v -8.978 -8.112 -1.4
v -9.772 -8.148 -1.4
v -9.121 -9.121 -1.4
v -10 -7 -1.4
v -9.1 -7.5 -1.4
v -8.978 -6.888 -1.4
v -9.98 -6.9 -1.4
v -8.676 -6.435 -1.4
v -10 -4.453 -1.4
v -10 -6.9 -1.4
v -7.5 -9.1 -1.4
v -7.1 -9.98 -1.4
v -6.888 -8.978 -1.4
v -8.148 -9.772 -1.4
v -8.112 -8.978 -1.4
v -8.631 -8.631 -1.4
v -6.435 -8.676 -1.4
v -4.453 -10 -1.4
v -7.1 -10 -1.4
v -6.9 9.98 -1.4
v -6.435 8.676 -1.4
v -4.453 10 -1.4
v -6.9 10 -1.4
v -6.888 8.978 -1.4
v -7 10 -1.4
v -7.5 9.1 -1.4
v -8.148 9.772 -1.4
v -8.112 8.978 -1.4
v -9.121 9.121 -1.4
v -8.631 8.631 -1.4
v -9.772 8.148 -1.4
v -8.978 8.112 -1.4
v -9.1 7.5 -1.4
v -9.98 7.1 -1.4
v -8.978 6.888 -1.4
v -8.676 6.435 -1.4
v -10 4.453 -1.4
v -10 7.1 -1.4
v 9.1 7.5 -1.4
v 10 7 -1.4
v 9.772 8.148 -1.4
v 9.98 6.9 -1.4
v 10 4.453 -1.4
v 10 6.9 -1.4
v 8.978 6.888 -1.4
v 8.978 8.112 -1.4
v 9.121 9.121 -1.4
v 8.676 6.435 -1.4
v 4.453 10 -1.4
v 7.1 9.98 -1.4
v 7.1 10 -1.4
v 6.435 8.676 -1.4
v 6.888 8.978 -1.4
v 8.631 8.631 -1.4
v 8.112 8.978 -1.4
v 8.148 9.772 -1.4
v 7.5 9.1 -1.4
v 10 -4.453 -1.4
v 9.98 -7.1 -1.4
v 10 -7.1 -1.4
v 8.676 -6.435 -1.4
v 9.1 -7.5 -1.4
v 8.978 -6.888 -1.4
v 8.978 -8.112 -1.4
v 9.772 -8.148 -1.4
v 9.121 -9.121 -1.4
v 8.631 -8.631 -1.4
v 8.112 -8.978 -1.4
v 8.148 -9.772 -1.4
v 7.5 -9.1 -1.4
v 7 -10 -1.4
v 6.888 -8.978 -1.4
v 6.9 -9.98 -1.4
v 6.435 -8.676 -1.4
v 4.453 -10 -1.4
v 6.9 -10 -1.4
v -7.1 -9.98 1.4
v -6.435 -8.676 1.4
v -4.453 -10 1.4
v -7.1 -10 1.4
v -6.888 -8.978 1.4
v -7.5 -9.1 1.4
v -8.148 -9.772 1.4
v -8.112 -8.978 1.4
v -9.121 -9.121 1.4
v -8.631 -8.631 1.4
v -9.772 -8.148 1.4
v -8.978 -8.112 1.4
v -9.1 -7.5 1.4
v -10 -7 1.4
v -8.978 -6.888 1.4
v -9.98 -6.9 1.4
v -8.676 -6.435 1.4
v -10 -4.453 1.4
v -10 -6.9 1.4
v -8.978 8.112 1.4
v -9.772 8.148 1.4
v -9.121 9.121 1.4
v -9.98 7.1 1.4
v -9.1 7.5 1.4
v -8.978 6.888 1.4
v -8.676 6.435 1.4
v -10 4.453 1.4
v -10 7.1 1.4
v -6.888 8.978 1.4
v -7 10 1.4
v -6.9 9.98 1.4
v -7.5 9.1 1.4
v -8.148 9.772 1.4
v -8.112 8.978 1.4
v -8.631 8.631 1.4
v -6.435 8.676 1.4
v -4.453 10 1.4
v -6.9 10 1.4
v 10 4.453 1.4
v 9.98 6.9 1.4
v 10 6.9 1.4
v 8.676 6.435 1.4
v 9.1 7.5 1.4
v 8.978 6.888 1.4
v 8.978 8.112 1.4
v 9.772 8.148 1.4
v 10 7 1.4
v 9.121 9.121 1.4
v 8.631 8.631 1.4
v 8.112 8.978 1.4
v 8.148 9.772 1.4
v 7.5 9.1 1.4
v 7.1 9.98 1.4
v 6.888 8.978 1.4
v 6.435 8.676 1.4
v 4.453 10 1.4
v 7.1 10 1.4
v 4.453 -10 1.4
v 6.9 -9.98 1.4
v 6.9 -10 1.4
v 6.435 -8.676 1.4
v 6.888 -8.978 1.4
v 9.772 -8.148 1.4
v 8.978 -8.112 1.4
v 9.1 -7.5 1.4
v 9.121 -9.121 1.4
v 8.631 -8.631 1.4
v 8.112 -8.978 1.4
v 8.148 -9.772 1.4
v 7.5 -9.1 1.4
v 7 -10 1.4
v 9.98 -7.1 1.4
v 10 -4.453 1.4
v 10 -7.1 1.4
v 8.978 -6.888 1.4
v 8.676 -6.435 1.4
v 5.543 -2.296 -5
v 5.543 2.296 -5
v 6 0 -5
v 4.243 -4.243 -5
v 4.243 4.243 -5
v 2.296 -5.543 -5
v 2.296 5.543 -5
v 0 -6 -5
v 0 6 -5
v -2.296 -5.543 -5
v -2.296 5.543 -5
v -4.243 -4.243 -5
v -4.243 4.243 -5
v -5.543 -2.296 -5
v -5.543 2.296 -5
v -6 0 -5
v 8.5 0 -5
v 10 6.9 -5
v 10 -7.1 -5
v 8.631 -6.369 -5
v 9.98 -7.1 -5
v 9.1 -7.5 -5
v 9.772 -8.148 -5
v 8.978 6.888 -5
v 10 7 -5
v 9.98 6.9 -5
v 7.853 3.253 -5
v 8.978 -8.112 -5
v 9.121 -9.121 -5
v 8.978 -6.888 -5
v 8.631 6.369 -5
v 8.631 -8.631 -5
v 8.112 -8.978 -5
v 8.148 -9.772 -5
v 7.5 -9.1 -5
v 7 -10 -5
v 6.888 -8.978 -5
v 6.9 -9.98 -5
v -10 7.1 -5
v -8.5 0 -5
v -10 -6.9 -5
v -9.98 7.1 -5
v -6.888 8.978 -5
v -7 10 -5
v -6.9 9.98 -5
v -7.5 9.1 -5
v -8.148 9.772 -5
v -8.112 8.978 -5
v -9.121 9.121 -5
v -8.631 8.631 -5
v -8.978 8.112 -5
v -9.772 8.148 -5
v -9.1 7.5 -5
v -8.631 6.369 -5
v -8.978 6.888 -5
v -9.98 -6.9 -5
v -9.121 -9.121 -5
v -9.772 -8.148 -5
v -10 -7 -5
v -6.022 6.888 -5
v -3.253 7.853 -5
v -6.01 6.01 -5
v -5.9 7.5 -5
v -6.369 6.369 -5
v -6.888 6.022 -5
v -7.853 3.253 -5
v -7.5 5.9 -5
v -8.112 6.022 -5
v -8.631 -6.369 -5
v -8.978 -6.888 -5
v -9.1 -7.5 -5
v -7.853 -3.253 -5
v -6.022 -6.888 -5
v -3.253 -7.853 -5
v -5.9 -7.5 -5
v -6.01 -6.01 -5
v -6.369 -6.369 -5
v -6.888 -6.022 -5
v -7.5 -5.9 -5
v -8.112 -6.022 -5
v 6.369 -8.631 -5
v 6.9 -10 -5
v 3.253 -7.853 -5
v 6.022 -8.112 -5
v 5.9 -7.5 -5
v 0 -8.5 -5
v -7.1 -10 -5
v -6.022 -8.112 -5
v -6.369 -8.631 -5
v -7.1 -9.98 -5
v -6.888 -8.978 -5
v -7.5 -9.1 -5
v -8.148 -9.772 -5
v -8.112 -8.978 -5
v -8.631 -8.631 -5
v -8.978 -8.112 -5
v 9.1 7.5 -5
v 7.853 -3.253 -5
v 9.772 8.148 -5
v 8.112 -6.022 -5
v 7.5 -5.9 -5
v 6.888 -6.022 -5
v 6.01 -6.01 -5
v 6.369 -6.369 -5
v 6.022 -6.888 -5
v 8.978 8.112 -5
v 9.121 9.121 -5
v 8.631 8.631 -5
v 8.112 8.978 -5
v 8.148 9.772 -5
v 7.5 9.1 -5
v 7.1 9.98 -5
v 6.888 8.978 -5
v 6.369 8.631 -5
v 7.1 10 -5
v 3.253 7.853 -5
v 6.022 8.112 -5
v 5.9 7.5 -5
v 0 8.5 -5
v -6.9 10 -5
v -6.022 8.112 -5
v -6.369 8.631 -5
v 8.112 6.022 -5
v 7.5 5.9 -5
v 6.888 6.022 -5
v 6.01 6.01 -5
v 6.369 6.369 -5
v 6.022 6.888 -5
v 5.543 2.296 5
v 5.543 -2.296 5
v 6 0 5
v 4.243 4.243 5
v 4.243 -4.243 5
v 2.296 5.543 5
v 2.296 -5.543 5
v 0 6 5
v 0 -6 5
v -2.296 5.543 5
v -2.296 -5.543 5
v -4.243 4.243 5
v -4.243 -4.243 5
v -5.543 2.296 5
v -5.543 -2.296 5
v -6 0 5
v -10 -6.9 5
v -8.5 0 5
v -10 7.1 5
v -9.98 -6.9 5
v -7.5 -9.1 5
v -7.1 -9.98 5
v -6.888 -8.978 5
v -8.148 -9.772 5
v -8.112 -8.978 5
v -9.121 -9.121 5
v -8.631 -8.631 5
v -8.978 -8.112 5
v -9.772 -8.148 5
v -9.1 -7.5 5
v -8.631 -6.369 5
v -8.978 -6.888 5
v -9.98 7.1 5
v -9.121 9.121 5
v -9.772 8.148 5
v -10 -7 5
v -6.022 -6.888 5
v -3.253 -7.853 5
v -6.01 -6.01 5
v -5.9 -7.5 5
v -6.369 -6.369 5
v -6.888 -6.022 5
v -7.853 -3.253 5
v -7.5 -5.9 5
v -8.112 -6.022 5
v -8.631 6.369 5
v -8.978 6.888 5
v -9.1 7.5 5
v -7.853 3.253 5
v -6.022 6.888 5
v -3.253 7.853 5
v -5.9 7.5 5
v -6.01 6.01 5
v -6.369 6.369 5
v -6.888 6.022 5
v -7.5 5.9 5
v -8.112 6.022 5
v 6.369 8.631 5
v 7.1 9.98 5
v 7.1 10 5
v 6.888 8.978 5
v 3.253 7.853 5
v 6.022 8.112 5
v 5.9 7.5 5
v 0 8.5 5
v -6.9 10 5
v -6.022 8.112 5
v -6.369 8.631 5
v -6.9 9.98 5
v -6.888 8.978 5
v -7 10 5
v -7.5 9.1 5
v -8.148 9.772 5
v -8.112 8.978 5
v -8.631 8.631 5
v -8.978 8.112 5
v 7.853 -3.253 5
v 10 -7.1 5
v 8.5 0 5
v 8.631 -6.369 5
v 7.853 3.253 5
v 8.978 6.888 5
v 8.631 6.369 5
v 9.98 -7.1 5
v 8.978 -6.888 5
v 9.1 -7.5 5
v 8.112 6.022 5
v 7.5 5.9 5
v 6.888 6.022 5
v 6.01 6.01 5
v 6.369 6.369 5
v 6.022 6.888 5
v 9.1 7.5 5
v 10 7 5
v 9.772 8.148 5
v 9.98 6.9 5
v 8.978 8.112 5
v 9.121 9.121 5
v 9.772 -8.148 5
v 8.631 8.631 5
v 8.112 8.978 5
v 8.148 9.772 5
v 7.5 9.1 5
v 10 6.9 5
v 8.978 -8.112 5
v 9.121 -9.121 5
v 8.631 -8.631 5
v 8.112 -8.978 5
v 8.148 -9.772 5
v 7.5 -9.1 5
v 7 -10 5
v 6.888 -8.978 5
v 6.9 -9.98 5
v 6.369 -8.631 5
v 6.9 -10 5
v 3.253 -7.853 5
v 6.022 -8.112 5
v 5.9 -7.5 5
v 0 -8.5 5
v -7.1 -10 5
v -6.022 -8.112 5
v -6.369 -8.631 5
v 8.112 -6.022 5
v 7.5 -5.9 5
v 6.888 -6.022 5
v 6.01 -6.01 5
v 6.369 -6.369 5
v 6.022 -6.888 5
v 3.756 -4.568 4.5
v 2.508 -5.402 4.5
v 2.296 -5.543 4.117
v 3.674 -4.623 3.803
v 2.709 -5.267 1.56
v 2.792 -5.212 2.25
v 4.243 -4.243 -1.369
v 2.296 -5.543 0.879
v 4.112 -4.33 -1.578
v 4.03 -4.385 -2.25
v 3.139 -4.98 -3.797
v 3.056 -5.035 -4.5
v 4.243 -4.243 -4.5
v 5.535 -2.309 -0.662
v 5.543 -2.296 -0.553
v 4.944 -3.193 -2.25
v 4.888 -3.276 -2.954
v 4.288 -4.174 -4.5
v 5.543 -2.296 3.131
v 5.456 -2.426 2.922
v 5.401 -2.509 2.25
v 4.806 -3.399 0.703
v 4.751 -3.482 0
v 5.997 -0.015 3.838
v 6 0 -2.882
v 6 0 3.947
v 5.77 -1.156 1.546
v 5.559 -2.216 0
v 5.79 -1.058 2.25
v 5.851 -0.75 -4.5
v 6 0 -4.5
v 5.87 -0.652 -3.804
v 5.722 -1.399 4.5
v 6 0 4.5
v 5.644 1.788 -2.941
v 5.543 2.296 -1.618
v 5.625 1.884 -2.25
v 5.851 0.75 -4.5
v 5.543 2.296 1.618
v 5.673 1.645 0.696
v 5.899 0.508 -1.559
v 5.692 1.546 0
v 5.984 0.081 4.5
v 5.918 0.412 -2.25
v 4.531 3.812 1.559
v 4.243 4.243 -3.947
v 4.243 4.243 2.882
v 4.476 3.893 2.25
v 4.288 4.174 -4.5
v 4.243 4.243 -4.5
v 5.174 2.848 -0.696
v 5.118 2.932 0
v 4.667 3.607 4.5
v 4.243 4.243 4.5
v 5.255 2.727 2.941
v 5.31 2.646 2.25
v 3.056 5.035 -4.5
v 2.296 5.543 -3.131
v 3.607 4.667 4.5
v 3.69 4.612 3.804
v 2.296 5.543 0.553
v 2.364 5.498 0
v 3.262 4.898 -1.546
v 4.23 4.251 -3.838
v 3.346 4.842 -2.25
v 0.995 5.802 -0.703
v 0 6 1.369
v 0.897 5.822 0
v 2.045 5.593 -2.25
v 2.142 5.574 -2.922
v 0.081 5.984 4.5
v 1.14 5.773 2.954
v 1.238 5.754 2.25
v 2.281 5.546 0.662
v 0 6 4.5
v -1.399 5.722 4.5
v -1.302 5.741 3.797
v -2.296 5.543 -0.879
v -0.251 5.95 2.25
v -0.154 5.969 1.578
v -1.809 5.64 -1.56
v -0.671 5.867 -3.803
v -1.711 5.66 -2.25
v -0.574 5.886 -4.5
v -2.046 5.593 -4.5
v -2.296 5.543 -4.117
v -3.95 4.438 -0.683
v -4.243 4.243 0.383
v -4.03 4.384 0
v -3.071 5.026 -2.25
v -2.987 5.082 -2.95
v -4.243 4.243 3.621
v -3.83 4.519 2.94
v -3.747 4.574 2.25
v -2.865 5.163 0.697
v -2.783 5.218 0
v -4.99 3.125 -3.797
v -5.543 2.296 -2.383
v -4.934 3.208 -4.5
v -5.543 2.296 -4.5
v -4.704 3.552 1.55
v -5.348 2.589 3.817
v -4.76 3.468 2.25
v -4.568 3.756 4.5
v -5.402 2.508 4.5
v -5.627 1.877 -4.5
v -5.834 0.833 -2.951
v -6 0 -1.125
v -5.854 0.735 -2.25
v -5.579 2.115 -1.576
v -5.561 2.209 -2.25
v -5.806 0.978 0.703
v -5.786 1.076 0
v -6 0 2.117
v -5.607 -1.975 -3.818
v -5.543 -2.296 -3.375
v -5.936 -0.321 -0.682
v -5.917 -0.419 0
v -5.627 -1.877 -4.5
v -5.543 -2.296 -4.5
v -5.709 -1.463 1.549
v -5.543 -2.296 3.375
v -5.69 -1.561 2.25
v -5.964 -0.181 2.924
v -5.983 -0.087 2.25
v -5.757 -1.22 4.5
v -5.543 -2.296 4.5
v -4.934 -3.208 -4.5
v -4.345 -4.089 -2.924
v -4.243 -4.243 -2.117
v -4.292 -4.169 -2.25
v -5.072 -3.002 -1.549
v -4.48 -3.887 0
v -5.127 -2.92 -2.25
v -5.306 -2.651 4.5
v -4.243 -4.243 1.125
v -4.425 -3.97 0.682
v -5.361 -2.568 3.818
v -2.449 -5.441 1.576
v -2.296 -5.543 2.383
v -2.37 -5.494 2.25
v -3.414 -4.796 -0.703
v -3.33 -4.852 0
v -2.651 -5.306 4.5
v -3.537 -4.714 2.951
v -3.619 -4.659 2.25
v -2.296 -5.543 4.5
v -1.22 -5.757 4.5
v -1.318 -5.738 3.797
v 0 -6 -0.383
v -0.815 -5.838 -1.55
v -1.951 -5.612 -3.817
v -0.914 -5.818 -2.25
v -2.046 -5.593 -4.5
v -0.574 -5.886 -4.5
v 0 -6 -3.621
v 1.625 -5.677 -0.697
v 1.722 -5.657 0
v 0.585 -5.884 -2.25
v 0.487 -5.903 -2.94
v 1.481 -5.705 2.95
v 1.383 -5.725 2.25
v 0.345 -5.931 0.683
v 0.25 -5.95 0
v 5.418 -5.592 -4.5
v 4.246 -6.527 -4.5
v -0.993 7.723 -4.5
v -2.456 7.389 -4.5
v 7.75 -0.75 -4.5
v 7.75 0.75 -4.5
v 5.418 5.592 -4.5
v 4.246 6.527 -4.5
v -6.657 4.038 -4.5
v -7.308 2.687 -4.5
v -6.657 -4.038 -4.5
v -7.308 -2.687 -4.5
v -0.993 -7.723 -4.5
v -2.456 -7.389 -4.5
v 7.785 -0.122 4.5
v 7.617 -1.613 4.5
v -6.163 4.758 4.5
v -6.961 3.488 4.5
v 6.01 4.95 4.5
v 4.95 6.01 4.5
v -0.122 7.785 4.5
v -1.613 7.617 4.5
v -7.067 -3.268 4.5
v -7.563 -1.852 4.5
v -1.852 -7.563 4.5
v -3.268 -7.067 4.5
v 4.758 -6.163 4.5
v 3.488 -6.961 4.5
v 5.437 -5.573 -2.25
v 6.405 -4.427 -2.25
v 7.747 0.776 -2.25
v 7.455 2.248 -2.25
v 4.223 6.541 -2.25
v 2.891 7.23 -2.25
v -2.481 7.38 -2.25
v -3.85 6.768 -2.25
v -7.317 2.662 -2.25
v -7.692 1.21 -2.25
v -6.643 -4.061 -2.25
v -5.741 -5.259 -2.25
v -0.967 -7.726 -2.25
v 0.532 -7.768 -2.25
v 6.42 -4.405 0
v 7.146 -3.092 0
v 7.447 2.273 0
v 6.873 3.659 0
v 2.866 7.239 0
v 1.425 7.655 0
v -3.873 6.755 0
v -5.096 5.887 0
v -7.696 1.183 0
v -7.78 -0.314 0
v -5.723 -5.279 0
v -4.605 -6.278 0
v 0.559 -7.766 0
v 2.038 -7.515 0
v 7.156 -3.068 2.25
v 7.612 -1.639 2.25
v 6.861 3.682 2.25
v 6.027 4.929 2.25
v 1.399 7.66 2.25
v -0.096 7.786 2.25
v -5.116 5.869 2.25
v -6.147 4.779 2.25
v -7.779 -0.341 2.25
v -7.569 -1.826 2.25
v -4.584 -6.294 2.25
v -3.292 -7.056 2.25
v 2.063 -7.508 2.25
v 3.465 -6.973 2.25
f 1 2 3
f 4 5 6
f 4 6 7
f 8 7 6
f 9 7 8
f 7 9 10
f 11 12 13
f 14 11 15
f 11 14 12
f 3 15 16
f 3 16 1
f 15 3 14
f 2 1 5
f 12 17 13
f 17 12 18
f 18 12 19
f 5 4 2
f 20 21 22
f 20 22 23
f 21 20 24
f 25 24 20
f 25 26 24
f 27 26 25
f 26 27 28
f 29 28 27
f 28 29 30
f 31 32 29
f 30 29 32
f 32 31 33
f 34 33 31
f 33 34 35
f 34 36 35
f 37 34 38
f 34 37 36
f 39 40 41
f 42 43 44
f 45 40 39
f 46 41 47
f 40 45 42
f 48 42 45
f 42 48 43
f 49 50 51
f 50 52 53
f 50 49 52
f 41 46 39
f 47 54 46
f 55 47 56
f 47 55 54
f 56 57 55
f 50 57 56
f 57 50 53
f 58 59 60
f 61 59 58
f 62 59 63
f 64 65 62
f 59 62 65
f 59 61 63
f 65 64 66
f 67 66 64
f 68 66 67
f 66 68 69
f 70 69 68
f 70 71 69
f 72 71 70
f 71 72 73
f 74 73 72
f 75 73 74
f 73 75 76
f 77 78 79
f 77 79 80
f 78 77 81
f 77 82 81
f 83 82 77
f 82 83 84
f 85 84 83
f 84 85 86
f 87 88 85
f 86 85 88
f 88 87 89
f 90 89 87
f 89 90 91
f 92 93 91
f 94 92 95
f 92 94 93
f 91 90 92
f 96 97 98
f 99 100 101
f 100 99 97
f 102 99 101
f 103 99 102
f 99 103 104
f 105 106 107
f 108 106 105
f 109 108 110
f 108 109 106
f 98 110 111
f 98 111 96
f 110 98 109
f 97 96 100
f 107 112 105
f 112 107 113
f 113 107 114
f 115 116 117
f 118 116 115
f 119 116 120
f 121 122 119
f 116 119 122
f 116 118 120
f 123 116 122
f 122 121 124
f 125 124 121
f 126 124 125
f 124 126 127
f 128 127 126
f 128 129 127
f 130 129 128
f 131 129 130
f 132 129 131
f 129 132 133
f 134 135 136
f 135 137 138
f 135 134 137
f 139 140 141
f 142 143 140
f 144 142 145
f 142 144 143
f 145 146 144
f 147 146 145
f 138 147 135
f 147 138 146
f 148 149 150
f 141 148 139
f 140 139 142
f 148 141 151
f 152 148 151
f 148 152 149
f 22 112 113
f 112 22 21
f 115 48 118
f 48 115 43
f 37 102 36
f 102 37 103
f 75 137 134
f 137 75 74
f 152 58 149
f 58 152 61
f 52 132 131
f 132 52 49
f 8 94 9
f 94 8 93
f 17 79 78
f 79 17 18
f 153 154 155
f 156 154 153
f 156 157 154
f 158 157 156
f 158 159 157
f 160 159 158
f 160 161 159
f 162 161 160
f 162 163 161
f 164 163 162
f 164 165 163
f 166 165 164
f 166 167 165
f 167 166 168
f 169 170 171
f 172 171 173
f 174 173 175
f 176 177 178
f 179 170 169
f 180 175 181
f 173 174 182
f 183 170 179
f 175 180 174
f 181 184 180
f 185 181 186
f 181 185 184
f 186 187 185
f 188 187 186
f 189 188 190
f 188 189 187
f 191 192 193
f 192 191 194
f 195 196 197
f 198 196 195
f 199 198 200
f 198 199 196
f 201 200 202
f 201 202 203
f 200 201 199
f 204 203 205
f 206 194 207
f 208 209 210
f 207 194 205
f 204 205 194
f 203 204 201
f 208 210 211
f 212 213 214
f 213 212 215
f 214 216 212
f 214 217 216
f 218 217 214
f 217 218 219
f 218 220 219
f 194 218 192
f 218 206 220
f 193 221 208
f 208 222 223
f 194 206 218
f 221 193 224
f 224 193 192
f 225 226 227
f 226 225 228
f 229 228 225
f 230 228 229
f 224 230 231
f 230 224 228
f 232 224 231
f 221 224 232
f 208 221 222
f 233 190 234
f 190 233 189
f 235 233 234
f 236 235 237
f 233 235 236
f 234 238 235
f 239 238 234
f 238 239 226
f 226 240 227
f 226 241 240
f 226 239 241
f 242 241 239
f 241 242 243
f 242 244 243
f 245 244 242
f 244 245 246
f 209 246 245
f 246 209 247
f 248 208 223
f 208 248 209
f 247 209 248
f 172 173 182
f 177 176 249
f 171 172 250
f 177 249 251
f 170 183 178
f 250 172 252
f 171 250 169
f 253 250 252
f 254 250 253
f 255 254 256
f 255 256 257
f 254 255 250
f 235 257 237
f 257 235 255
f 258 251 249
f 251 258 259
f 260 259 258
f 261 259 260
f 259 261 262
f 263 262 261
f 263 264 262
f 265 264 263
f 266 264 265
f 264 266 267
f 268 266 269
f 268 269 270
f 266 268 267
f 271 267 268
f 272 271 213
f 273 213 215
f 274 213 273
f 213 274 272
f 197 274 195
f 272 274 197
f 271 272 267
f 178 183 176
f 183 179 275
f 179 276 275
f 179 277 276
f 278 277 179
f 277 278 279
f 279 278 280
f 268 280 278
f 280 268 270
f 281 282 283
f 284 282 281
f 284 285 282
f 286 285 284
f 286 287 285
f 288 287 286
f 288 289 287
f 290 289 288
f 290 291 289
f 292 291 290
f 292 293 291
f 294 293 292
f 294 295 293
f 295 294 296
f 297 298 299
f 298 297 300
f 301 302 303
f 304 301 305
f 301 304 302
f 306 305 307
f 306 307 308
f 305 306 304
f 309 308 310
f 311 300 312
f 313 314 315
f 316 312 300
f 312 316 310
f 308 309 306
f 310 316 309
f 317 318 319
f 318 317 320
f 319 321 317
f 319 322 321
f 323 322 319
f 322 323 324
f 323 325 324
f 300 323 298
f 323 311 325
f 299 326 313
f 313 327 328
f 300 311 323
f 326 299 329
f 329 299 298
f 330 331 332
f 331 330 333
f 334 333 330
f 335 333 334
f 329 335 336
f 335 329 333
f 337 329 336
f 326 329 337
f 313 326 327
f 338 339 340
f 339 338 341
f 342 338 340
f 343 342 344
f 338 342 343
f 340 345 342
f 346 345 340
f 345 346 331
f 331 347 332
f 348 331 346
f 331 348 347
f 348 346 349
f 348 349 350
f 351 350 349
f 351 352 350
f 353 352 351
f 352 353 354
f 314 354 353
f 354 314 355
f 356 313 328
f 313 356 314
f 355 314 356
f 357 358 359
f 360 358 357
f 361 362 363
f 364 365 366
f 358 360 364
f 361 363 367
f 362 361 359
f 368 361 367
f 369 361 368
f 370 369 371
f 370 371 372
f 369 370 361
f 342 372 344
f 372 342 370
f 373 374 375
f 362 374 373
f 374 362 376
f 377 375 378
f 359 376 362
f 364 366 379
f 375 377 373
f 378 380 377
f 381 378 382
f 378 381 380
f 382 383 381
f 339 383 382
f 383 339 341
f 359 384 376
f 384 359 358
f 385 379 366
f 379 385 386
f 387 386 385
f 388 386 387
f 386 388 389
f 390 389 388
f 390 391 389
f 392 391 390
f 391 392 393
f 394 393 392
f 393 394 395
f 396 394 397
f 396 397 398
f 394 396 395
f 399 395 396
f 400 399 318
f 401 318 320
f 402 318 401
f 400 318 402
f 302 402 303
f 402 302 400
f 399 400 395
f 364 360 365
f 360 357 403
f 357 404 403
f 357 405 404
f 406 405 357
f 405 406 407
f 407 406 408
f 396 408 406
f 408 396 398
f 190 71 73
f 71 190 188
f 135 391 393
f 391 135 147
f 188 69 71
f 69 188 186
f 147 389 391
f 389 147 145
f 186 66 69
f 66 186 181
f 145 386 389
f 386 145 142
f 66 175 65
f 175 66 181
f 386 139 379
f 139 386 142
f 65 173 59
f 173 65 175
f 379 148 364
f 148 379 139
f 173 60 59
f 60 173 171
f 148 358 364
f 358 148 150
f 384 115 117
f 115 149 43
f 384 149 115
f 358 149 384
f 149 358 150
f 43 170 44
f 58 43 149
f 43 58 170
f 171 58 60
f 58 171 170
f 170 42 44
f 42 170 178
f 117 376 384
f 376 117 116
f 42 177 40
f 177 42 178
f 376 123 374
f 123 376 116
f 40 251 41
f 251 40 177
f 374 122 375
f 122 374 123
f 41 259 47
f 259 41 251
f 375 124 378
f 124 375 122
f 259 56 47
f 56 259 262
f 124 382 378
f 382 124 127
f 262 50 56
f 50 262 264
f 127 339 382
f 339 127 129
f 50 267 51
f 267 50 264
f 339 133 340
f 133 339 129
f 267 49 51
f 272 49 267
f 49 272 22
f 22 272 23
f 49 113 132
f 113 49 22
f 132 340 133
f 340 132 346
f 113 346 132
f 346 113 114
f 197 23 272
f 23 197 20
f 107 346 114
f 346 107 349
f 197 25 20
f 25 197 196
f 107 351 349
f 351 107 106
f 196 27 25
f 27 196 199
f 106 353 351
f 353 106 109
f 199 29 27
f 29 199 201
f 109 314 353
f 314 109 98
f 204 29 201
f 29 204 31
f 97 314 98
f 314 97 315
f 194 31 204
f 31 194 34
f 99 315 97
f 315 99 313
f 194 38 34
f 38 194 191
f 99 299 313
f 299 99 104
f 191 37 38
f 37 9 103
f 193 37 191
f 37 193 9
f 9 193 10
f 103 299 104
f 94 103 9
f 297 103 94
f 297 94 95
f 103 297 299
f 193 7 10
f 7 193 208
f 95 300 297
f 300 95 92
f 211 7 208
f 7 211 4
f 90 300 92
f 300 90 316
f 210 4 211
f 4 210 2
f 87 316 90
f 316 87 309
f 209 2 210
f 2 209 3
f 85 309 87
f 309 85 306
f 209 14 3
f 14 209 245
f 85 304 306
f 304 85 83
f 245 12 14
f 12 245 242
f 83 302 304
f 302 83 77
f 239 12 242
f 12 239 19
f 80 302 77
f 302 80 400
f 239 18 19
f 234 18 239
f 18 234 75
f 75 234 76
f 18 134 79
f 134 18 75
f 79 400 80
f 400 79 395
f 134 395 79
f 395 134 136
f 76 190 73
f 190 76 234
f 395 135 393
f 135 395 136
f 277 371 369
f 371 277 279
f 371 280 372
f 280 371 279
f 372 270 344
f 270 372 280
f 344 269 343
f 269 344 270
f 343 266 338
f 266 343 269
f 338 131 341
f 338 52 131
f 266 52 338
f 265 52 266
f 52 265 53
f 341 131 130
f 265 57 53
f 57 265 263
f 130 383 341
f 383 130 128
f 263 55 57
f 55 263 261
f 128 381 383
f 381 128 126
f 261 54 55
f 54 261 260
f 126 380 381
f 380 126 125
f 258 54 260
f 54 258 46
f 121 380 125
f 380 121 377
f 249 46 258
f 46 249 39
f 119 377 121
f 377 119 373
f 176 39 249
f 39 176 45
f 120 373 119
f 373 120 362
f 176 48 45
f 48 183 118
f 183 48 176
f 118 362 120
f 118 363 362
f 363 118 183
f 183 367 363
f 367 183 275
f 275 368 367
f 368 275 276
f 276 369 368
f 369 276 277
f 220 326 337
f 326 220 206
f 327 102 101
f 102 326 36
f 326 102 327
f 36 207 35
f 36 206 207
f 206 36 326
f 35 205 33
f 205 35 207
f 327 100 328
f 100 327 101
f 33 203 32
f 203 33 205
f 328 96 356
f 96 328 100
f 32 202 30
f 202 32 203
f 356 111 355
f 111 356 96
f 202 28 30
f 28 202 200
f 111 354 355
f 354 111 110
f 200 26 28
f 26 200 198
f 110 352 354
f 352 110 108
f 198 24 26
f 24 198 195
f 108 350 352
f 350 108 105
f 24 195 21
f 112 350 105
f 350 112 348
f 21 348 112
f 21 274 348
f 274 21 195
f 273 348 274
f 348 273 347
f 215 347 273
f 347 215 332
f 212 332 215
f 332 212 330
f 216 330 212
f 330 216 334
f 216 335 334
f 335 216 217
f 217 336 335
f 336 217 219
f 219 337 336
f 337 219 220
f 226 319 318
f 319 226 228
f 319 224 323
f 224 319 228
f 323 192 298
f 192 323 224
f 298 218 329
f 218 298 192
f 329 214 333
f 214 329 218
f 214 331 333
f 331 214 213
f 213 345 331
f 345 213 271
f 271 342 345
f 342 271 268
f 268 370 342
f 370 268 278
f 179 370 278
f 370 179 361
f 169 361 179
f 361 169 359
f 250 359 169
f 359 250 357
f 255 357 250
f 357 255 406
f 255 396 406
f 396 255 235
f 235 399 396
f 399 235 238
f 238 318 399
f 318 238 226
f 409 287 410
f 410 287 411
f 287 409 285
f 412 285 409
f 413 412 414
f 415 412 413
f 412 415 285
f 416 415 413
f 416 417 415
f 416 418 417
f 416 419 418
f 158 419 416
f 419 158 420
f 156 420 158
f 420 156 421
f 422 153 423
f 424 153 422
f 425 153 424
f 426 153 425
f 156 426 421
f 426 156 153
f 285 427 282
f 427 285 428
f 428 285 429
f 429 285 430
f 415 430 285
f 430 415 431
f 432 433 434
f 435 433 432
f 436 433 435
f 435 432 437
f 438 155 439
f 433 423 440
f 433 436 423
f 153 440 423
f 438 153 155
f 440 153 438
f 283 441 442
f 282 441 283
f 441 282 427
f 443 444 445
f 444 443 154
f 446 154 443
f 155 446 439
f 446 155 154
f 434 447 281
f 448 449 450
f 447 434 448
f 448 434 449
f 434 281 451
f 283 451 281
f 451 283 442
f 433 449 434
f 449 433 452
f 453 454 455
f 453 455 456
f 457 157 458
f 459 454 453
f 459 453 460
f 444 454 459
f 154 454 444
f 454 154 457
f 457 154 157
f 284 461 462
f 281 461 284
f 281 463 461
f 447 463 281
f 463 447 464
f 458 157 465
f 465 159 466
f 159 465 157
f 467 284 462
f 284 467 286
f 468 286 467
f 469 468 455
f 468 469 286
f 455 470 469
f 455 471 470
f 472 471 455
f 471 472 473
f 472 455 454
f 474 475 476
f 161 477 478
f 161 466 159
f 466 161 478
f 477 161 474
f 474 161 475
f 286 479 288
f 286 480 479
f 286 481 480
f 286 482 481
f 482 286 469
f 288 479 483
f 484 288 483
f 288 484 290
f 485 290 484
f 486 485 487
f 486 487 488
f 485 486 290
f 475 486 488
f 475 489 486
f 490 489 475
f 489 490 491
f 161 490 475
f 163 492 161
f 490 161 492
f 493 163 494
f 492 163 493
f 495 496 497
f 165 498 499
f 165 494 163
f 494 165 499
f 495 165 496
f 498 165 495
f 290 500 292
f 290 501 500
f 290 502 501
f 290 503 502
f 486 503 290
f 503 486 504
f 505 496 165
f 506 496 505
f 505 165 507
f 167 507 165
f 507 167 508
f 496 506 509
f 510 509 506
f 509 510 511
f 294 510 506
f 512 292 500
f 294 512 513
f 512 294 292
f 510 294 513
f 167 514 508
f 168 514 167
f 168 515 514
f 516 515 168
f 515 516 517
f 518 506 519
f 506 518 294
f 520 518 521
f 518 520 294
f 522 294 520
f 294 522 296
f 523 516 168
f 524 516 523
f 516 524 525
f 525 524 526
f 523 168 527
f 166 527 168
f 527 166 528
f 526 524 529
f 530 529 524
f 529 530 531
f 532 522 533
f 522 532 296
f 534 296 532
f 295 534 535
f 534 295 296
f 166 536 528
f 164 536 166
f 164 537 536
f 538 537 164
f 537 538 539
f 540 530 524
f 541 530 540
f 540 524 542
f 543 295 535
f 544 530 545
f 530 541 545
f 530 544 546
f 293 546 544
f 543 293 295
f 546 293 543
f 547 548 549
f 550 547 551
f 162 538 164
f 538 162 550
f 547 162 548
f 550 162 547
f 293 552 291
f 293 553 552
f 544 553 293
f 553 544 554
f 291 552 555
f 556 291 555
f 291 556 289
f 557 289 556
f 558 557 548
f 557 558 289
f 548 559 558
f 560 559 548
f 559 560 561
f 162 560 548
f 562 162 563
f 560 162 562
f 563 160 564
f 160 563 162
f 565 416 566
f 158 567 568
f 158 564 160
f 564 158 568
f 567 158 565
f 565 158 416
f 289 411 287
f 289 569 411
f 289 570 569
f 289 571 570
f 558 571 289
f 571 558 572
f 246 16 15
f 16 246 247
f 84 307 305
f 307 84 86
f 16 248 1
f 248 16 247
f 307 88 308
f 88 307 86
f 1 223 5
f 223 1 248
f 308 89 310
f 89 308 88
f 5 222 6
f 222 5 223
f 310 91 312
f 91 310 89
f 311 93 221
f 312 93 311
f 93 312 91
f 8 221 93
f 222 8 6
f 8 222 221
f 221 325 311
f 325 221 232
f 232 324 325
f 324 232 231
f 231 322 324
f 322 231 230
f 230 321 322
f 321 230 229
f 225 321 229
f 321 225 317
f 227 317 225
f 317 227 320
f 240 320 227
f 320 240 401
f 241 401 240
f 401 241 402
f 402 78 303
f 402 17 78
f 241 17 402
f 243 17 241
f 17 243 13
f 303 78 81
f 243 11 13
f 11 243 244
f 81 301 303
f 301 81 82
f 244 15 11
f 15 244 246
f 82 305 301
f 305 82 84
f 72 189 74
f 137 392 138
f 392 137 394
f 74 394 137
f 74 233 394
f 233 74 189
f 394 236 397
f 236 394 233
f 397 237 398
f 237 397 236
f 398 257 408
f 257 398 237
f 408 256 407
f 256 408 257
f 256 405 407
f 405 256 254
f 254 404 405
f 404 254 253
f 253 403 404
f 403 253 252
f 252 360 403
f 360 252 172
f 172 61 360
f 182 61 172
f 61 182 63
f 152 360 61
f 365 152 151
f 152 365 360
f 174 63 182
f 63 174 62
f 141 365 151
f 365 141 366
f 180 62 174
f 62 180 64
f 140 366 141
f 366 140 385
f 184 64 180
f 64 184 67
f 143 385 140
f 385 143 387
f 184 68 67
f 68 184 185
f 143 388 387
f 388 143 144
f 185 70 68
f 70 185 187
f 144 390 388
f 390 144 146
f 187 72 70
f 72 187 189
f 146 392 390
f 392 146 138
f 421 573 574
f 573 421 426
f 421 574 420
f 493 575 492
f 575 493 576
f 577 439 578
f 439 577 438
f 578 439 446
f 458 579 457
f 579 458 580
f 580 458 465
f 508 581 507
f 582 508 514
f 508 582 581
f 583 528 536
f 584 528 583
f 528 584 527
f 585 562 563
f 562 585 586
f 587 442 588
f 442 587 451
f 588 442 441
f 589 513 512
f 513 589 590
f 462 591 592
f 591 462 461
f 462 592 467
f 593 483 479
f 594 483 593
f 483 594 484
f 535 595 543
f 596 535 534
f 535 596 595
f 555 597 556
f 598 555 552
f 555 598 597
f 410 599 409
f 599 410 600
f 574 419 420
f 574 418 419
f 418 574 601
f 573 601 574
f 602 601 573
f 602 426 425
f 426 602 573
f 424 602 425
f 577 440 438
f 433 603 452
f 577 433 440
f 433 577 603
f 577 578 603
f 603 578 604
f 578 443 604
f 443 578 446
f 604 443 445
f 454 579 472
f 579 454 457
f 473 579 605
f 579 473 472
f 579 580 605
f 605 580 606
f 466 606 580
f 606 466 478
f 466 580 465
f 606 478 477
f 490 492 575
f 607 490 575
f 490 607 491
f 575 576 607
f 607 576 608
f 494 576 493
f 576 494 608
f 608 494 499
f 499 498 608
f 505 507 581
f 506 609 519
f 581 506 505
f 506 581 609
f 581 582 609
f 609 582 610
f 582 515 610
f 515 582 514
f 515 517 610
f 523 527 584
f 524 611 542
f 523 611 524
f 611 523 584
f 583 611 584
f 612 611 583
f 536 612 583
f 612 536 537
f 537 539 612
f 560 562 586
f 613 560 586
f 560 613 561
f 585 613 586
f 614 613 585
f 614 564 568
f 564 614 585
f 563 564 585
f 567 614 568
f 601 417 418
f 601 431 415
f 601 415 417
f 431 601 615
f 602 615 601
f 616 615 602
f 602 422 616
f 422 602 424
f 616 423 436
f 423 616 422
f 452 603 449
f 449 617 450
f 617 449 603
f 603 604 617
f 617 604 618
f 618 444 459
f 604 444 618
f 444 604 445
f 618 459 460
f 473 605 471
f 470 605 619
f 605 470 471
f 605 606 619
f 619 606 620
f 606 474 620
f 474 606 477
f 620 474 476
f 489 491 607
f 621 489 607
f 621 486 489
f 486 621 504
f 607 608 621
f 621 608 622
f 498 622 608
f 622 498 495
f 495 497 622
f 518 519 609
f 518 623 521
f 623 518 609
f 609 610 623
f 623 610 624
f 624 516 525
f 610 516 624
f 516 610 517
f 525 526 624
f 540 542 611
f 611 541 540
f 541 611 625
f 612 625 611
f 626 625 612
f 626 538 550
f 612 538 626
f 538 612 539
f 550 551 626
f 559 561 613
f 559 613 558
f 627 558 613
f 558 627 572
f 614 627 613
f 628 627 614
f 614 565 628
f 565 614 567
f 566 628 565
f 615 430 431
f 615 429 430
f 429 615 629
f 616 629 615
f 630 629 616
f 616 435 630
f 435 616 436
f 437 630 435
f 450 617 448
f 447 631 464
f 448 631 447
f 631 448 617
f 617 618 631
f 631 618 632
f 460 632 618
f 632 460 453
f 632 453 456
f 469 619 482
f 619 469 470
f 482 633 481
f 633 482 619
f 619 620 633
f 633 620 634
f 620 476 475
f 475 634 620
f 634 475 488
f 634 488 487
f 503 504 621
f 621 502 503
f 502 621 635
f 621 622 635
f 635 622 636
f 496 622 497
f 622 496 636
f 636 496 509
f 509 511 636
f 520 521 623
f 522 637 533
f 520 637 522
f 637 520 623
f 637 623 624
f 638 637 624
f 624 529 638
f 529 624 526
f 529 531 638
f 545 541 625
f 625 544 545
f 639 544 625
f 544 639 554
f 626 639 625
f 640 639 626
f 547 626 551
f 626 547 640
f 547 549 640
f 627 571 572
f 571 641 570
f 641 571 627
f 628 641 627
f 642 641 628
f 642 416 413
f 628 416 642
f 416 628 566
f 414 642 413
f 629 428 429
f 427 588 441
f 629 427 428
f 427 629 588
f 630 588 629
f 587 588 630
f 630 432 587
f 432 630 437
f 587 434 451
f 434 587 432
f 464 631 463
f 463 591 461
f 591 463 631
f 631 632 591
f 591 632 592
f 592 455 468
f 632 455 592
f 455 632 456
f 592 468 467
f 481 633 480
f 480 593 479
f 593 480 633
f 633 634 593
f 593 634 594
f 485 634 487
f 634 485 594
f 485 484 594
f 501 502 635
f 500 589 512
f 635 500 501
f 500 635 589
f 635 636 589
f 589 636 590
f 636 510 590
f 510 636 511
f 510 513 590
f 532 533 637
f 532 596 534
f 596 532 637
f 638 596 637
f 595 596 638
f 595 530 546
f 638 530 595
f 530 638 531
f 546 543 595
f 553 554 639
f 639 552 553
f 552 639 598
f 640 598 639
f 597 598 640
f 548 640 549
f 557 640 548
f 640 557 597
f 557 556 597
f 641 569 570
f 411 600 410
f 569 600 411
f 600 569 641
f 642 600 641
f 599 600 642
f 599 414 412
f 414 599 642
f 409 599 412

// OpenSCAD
// file: Param.scad
//axe : disponible : 320*2/350*2/370*2/470*4/405*2
axe_x = 370;
axe_y = 470;
axe_z = 370;

Frame_e = 16;
coulisse_d = 8;
angle_e=3.5;

// Constant
r608z_d=8;
r608z_D=22;
r608z_e=7;

nema17_L=42;
nema17_axe_d=5.2;

Pulley_GT2_8_e=17.5;
Pulley_GT2_8_D=26;
Pulley_GT2_8_tooth_w=6.2;

GT2_w=6;

BagueLaiton_D=12;
BagueLaiton_L=30;

Vis_m3_p = 3.2;
Vis_m3_t = 5;

// resolution of round object. each line segment is fnr mm long. fnr = 1 crude and good for development (its faster), aim for fnr = 0.4 or smaller for a production render. smaller means more details (and a lot more time to render).
resolution = 0.4;
// detail level
detaillevel = 1; // [0:coarse render only outlines,1:fine render with all details]
// 
withfan = 0; // [0:render without fan frame,1:render with fan frame]

_globalResolution = 16;

// Data
Frame_L = axe_x-Pulley_GT2_8_e-angle_e+Frame_e;
Frame_l = axe_y-Pulley_GT2_8_e-angle_e+Frame_e;
Frame_h = axe_z;

coulisse_e = 3*coulisse_d;
coulisse_eh = (r608z_D*1.7)/2+4;
coulisse_ec = r608z_D+10;

Cross_ec = BagueLaiton_D+1;

angle_h=coulisse_e+coulisse_eh+r608z_D;
// main file
include <Param.scad>;

fan(20, 10, 15, 3.2, 3,-45);

module fan(width, depth, mount, mount_diameter=3.4, corner_radius=5, blade_angle=-45)
{
  bore_diameter = width - 3;

  color ("dimgrey")
  {
    body(width, depth, bore_diameter, mount, mount_diameter, corner_radius);
    fan_blades(bore_diameter, depth, blade_angle);
  }
}

module body(width, depth, bore_diameter, mount, mount_diameter, corner_radius)
{
  difference()
  {
    linear_extrude(height=depth, center = true, convexity = 4, twist = 0)
    {
      difference()
      {
        square([width, width], center=true);
        inside_bore(bore_diameter, width/2 + 2);
        mounting_holes(mount/2, mount_diameter/2, depth+0.2);
        round_corners(width/2, corner_radius);
      }
    }

    outside_ring(width, depth);
  }
}

module inside_bore(diameter, hub)
{
  difference()
  {
    circle(r=diameter/2,center=true,$fn=_globalResolution );
    circle(r=hub/2,center=true,$fn=_globalResolution );
  }
}

module mounting_holes(offset, r, h)
{
  for (i=[0:3])
  {
    rotate([0,0,i*90])
    {
      translate([offset, offset])
      {
        circle(r=r, h=h, center=true,$fn=_globalResolution );
      }
    }
  }
}

module round_corners(offset, r=5)
{
  for(i=[0:3])
  {
    rotate([0,0,i*90])
    {
      translate([offset,offset])
      {
        difference()
        {
          translate([-r+0.1, -r-0.1])
          {
            square([r+0.2, r+0.2]);
          }

          translate([-r, -r])
          {
            circle(r=r,$fn=_globalResolution );
          }
        }
      }
    }
  }
}

module outside_ring(width, depth, surface_thickness=3.6)
{
  difference()
  {
    cylinder(r=width*.75, h=depth-2*surface_thickness, center=true,$fn=_globalResolution );
    cylinder(r=(width+2)/2, h=depth-2*surface_thickness+0.2, center=true,$fn=_globalResolution );
  }
}

module fan_blades(width, depth, angle)
{
  linear_extrude(height=depth-1, center = true, convexity = 4, twist = angle)
  {
    for(i=[0:6])
    rotate((360*i)/7)
    translate([0,-1.5/2]) square([width/2-0.75,1.5]);
  }
}
